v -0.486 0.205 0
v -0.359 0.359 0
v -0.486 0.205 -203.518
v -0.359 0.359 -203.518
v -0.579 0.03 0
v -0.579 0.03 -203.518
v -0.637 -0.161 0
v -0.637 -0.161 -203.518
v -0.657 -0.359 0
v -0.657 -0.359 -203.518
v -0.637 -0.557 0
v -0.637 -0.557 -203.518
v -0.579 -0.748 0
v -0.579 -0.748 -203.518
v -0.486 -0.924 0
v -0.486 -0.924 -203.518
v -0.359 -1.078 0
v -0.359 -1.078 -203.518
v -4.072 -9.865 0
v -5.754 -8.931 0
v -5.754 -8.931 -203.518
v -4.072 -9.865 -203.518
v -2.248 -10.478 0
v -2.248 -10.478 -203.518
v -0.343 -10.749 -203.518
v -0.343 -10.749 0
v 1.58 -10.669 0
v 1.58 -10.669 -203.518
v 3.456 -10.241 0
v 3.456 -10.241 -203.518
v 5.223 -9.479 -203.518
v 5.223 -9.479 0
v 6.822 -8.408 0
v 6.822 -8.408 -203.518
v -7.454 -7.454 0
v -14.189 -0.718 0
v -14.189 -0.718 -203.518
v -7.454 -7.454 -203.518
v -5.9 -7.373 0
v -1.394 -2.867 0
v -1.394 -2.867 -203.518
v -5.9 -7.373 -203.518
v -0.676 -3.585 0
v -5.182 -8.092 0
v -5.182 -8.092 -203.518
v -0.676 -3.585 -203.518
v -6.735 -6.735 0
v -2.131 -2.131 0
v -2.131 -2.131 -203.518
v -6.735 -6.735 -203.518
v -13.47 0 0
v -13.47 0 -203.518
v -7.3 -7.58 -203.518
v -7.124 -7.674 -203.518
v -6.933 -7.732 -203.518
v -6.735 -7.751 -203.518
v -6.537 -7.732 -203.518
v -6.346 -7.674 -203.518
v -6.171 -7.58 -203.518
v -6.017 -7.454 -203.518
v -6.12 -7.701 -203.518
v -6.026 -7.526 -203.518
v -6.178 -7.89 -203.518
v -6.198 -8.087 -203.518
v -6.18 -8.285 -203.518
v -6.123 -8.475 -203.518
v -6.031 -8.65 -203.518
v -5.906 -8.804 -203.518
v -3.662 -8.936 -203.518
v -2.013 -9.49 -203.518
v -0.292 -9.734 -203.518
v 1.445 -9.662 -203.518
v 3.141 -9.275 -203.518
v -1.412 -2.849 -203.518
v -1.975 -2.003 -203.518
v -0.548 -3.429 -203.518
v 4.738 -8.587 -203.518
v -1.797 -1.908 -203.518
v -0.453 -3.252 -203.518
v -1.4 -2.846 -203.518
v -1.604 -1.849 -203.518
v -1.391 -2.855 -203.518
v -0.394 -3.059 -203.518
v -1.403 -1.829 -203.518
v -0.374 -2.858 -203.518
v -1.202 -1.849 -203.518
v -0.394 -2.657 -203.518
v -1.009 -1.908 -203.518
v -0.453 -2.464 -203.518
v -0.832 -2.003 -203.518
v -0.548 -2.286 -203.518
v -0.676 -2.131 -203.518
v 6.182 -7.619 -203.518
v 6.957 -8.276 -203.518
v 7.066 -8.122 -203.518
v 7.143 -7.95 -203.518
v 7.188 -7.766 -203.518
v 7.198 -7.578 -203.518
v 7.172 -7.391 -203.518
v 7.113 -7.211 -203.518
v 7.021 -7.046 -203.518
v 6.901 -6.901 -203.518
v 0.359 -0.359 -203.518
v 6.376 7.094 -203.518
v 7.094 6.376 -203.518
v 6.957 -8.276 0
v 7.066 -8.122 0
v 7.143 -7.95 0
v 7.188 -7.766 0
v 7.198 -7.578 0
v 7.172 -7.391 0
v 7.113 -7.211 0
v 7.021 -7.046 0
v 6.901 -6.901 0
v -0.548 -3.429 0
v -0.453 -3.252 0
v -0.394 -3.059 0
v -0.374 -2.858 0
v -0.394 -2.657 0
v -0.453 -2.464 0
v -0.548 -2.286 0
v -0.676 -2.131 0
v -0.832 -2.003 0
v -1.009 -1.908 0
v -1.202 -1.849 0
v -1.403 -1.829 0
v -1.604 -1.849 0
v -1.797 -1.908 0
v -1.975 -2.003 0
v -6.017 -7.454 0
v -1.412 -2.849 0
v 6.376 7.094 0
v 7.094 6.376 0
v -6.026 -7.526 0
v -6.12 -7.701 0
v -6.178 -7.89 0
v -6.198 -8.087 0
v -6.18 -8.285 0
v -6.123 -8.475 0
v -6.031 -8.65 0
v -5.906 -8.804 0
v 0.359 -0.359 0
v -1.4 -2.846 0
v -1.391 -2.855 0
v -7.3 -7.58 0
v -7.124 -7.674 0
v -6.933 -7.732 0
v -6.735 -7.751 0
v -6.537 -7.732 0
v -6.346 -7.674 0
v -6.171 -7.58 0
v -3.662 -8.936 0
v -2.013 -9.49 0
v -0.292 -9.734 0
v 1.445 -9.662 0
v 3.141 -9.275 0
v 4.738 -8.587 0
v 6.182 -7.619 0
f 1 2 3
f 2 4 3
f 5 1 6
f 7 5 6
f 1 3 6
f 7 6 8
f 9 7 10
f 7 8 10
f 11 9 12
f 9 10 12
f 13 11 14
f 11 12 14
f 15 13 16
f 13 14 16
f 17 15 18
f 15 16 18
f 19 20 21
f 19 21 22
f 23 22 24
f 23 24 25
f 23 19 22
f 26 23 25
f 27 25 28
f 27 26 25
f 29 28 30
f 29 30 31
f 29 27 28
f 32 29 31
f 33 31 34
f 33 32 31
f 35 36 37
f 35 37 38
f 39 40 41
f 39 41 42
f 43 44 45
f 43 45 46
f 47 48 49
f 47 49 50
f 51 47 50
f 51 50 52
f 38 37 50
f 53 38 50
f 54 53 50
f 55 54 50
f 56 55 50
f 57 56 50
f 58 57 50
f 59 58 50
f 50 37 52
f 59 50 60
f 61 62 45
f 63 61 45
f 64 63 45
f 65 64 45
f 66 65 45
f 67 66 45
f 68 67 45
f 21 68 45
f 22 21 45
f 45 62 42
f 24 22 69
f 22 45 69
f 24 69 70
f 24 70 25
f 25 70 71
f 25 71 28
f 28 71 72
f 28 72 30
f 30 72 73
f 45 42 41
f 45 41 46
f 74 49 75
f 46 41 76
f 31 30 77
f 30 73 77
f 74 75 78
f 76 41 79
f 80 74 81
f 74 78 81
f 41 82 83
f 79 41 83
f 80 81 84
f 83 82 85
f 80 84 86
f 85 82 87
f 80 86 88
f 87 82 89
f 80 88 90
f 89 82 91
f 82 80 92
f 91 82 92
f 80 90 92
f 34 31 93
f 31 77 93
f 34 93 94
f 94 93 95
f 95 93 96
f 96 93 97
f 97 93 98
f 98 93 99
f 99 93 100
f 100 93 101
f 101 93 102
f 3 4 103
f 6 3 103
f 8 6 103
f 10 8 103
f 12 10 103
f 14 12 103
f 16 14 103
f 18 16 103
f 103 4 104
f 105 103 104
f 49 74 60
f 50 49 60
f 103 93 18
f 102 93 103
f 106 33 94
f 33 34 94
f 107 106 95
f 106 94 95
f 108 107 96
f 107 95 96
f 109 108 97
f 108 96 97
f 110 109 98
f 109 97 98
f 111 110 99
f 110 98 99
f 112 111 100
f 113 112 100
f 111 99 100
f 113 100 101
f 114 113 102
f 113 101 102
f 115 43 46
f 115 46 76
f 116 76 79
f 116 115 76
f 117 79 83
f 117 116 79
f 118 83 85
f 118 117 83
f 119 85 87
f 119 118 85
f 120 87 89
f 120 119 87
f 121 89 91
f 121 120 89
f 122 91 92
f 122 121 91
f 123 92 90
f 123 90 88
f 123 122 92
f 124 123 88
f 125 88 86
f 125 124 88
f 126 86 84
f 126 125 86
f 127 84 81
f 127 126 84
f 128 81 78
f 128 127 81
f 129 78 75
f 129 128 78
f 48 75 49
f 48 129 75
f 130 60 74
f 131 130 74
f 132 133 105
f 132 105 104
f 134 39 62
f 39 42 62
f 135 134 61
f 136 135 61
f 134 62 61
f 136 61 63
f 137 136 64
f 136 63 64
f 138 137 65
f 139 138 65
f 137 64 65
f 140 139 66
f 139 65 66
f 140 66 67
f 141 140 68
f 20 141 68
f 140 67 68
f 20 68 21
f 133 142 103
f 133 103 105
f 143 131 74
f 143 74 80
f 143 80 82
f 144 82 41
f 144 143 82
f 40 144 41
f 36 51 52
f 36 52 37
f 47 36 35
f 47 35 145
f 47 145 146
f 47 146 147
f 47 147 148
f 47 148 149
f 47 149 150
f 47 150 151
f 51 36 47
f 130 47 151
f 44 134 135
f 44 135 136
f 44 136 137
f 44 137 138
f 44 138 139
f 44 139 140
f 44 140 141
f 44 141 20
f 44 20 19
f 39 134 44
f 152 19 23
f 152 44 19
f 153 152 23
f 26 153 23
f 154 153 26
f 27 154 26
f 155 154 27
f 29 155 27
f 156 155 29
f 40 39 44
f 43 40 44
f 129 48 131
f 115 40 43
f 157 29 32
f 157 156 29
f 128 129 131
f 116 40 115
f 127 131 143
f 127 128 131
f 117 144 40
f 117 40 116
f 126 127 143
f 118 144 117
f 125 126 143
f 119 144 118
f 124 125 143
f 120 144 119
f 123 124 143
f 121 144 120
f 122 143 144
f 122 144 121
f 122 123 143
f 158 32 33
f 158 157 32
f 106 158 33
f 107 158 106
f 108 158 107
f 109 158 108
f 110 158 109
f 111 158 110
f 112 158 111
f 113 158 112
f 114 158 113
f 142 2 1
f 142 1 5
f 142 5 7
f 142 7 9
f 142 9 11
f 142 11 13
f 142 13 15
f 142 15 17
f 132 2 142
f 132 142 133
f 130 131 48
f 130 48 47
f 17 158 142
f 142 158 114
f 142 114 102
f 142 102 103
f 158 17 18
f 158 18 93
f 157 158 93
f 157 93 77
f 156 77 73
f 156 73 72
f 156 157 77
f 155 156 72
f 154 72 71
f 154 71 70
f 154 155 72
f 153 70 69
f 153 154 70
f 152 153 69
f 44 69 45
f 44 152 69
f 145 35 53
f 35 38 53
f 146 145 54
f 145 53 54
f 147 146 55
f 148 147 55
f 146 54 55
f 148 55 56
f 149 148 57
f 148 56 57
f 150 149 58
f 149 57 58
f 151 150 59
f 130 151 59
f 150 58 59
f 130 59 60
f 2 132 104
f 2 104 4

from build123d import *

# Parameters (mm, degrees)
BOSS_EXTRUDE1_DEPTH = 203.5175
FILLET1_R           = 1.016


with BuildPart() as part:
    # Sketch2 → Boss-Extrude1 (new body)
    with BuildSketch(Plane.XY):
        with BuildLine():
            Line((-6.735192091, -6.735192091), (-13.470384182, 0))
            Line((-13.470384182, 0), (-14.188804671, -0.71842049))
            Line((-14.188804671, -0.71842049), (-6.735192091, -8.17203307))
            Line((-6.735192091, -8.17203307), (-1.412145275, -2.848986254))
            ThreePointArc((-1.412145275, -2.848986254), (-1.394184763, -2.848986254), (-1.394184763, -2.866946767))
            Line((-1.394184763, -2.866946767), (-6.717231579, -8.189993582))
            ThreePointArc((-6.717231579, -8.189993582), (0.574505978, -10.754978809), (7.655668343, -7.655668343))
            Line((7.655668343, -7.655668343), (0.359210245, -0.359210245))
            Line((0.359210245, -0.359210245), (7.094402336, 6.375981846))
            Line((7.094402336, 6.375981846), (6.375981846, 7.094402336))
            Line((6.375981846, 7.094402336), (-1.077630735, -0.359210245))
            Line((-1.077630735, -0.359210245), (6.182455958, -7.619296938))
            ThreePointArc((6.182455958, -7.619296938), (0.578453997, -9.738038748), (-5.182039359, -8.091642343))
            Line((-5.182039359, -8.091642343), (-0.675764273, -3.585367256))
            ThreePointArc((-0.675764273, -3.585367256), (-0.675764273, -2.130565765), (-2.130565765, -2.130565765))
            Line((-2.130565765, -2.130565765), (-6.735192091, -6.735192091))
        make_face()
    extrude(amount=-BOSS_EXTRUDE1_DEPTH)

    # Fillet1
    fillet1_edges = [part.edges().sort_by_distance(p)[0] for p in [
        (-1.077630735, -0.359210245, -101.75875),
        (7.655668343, -7.655668343, -101.75875),
        (-6.717231579, -8.189993582, -101.75875),
        (-6.735192091, -8.17203307, -101.75875),
    ]]
    fillet(fillet1_edges, radius=FILLET1_R)


solid = part.part
